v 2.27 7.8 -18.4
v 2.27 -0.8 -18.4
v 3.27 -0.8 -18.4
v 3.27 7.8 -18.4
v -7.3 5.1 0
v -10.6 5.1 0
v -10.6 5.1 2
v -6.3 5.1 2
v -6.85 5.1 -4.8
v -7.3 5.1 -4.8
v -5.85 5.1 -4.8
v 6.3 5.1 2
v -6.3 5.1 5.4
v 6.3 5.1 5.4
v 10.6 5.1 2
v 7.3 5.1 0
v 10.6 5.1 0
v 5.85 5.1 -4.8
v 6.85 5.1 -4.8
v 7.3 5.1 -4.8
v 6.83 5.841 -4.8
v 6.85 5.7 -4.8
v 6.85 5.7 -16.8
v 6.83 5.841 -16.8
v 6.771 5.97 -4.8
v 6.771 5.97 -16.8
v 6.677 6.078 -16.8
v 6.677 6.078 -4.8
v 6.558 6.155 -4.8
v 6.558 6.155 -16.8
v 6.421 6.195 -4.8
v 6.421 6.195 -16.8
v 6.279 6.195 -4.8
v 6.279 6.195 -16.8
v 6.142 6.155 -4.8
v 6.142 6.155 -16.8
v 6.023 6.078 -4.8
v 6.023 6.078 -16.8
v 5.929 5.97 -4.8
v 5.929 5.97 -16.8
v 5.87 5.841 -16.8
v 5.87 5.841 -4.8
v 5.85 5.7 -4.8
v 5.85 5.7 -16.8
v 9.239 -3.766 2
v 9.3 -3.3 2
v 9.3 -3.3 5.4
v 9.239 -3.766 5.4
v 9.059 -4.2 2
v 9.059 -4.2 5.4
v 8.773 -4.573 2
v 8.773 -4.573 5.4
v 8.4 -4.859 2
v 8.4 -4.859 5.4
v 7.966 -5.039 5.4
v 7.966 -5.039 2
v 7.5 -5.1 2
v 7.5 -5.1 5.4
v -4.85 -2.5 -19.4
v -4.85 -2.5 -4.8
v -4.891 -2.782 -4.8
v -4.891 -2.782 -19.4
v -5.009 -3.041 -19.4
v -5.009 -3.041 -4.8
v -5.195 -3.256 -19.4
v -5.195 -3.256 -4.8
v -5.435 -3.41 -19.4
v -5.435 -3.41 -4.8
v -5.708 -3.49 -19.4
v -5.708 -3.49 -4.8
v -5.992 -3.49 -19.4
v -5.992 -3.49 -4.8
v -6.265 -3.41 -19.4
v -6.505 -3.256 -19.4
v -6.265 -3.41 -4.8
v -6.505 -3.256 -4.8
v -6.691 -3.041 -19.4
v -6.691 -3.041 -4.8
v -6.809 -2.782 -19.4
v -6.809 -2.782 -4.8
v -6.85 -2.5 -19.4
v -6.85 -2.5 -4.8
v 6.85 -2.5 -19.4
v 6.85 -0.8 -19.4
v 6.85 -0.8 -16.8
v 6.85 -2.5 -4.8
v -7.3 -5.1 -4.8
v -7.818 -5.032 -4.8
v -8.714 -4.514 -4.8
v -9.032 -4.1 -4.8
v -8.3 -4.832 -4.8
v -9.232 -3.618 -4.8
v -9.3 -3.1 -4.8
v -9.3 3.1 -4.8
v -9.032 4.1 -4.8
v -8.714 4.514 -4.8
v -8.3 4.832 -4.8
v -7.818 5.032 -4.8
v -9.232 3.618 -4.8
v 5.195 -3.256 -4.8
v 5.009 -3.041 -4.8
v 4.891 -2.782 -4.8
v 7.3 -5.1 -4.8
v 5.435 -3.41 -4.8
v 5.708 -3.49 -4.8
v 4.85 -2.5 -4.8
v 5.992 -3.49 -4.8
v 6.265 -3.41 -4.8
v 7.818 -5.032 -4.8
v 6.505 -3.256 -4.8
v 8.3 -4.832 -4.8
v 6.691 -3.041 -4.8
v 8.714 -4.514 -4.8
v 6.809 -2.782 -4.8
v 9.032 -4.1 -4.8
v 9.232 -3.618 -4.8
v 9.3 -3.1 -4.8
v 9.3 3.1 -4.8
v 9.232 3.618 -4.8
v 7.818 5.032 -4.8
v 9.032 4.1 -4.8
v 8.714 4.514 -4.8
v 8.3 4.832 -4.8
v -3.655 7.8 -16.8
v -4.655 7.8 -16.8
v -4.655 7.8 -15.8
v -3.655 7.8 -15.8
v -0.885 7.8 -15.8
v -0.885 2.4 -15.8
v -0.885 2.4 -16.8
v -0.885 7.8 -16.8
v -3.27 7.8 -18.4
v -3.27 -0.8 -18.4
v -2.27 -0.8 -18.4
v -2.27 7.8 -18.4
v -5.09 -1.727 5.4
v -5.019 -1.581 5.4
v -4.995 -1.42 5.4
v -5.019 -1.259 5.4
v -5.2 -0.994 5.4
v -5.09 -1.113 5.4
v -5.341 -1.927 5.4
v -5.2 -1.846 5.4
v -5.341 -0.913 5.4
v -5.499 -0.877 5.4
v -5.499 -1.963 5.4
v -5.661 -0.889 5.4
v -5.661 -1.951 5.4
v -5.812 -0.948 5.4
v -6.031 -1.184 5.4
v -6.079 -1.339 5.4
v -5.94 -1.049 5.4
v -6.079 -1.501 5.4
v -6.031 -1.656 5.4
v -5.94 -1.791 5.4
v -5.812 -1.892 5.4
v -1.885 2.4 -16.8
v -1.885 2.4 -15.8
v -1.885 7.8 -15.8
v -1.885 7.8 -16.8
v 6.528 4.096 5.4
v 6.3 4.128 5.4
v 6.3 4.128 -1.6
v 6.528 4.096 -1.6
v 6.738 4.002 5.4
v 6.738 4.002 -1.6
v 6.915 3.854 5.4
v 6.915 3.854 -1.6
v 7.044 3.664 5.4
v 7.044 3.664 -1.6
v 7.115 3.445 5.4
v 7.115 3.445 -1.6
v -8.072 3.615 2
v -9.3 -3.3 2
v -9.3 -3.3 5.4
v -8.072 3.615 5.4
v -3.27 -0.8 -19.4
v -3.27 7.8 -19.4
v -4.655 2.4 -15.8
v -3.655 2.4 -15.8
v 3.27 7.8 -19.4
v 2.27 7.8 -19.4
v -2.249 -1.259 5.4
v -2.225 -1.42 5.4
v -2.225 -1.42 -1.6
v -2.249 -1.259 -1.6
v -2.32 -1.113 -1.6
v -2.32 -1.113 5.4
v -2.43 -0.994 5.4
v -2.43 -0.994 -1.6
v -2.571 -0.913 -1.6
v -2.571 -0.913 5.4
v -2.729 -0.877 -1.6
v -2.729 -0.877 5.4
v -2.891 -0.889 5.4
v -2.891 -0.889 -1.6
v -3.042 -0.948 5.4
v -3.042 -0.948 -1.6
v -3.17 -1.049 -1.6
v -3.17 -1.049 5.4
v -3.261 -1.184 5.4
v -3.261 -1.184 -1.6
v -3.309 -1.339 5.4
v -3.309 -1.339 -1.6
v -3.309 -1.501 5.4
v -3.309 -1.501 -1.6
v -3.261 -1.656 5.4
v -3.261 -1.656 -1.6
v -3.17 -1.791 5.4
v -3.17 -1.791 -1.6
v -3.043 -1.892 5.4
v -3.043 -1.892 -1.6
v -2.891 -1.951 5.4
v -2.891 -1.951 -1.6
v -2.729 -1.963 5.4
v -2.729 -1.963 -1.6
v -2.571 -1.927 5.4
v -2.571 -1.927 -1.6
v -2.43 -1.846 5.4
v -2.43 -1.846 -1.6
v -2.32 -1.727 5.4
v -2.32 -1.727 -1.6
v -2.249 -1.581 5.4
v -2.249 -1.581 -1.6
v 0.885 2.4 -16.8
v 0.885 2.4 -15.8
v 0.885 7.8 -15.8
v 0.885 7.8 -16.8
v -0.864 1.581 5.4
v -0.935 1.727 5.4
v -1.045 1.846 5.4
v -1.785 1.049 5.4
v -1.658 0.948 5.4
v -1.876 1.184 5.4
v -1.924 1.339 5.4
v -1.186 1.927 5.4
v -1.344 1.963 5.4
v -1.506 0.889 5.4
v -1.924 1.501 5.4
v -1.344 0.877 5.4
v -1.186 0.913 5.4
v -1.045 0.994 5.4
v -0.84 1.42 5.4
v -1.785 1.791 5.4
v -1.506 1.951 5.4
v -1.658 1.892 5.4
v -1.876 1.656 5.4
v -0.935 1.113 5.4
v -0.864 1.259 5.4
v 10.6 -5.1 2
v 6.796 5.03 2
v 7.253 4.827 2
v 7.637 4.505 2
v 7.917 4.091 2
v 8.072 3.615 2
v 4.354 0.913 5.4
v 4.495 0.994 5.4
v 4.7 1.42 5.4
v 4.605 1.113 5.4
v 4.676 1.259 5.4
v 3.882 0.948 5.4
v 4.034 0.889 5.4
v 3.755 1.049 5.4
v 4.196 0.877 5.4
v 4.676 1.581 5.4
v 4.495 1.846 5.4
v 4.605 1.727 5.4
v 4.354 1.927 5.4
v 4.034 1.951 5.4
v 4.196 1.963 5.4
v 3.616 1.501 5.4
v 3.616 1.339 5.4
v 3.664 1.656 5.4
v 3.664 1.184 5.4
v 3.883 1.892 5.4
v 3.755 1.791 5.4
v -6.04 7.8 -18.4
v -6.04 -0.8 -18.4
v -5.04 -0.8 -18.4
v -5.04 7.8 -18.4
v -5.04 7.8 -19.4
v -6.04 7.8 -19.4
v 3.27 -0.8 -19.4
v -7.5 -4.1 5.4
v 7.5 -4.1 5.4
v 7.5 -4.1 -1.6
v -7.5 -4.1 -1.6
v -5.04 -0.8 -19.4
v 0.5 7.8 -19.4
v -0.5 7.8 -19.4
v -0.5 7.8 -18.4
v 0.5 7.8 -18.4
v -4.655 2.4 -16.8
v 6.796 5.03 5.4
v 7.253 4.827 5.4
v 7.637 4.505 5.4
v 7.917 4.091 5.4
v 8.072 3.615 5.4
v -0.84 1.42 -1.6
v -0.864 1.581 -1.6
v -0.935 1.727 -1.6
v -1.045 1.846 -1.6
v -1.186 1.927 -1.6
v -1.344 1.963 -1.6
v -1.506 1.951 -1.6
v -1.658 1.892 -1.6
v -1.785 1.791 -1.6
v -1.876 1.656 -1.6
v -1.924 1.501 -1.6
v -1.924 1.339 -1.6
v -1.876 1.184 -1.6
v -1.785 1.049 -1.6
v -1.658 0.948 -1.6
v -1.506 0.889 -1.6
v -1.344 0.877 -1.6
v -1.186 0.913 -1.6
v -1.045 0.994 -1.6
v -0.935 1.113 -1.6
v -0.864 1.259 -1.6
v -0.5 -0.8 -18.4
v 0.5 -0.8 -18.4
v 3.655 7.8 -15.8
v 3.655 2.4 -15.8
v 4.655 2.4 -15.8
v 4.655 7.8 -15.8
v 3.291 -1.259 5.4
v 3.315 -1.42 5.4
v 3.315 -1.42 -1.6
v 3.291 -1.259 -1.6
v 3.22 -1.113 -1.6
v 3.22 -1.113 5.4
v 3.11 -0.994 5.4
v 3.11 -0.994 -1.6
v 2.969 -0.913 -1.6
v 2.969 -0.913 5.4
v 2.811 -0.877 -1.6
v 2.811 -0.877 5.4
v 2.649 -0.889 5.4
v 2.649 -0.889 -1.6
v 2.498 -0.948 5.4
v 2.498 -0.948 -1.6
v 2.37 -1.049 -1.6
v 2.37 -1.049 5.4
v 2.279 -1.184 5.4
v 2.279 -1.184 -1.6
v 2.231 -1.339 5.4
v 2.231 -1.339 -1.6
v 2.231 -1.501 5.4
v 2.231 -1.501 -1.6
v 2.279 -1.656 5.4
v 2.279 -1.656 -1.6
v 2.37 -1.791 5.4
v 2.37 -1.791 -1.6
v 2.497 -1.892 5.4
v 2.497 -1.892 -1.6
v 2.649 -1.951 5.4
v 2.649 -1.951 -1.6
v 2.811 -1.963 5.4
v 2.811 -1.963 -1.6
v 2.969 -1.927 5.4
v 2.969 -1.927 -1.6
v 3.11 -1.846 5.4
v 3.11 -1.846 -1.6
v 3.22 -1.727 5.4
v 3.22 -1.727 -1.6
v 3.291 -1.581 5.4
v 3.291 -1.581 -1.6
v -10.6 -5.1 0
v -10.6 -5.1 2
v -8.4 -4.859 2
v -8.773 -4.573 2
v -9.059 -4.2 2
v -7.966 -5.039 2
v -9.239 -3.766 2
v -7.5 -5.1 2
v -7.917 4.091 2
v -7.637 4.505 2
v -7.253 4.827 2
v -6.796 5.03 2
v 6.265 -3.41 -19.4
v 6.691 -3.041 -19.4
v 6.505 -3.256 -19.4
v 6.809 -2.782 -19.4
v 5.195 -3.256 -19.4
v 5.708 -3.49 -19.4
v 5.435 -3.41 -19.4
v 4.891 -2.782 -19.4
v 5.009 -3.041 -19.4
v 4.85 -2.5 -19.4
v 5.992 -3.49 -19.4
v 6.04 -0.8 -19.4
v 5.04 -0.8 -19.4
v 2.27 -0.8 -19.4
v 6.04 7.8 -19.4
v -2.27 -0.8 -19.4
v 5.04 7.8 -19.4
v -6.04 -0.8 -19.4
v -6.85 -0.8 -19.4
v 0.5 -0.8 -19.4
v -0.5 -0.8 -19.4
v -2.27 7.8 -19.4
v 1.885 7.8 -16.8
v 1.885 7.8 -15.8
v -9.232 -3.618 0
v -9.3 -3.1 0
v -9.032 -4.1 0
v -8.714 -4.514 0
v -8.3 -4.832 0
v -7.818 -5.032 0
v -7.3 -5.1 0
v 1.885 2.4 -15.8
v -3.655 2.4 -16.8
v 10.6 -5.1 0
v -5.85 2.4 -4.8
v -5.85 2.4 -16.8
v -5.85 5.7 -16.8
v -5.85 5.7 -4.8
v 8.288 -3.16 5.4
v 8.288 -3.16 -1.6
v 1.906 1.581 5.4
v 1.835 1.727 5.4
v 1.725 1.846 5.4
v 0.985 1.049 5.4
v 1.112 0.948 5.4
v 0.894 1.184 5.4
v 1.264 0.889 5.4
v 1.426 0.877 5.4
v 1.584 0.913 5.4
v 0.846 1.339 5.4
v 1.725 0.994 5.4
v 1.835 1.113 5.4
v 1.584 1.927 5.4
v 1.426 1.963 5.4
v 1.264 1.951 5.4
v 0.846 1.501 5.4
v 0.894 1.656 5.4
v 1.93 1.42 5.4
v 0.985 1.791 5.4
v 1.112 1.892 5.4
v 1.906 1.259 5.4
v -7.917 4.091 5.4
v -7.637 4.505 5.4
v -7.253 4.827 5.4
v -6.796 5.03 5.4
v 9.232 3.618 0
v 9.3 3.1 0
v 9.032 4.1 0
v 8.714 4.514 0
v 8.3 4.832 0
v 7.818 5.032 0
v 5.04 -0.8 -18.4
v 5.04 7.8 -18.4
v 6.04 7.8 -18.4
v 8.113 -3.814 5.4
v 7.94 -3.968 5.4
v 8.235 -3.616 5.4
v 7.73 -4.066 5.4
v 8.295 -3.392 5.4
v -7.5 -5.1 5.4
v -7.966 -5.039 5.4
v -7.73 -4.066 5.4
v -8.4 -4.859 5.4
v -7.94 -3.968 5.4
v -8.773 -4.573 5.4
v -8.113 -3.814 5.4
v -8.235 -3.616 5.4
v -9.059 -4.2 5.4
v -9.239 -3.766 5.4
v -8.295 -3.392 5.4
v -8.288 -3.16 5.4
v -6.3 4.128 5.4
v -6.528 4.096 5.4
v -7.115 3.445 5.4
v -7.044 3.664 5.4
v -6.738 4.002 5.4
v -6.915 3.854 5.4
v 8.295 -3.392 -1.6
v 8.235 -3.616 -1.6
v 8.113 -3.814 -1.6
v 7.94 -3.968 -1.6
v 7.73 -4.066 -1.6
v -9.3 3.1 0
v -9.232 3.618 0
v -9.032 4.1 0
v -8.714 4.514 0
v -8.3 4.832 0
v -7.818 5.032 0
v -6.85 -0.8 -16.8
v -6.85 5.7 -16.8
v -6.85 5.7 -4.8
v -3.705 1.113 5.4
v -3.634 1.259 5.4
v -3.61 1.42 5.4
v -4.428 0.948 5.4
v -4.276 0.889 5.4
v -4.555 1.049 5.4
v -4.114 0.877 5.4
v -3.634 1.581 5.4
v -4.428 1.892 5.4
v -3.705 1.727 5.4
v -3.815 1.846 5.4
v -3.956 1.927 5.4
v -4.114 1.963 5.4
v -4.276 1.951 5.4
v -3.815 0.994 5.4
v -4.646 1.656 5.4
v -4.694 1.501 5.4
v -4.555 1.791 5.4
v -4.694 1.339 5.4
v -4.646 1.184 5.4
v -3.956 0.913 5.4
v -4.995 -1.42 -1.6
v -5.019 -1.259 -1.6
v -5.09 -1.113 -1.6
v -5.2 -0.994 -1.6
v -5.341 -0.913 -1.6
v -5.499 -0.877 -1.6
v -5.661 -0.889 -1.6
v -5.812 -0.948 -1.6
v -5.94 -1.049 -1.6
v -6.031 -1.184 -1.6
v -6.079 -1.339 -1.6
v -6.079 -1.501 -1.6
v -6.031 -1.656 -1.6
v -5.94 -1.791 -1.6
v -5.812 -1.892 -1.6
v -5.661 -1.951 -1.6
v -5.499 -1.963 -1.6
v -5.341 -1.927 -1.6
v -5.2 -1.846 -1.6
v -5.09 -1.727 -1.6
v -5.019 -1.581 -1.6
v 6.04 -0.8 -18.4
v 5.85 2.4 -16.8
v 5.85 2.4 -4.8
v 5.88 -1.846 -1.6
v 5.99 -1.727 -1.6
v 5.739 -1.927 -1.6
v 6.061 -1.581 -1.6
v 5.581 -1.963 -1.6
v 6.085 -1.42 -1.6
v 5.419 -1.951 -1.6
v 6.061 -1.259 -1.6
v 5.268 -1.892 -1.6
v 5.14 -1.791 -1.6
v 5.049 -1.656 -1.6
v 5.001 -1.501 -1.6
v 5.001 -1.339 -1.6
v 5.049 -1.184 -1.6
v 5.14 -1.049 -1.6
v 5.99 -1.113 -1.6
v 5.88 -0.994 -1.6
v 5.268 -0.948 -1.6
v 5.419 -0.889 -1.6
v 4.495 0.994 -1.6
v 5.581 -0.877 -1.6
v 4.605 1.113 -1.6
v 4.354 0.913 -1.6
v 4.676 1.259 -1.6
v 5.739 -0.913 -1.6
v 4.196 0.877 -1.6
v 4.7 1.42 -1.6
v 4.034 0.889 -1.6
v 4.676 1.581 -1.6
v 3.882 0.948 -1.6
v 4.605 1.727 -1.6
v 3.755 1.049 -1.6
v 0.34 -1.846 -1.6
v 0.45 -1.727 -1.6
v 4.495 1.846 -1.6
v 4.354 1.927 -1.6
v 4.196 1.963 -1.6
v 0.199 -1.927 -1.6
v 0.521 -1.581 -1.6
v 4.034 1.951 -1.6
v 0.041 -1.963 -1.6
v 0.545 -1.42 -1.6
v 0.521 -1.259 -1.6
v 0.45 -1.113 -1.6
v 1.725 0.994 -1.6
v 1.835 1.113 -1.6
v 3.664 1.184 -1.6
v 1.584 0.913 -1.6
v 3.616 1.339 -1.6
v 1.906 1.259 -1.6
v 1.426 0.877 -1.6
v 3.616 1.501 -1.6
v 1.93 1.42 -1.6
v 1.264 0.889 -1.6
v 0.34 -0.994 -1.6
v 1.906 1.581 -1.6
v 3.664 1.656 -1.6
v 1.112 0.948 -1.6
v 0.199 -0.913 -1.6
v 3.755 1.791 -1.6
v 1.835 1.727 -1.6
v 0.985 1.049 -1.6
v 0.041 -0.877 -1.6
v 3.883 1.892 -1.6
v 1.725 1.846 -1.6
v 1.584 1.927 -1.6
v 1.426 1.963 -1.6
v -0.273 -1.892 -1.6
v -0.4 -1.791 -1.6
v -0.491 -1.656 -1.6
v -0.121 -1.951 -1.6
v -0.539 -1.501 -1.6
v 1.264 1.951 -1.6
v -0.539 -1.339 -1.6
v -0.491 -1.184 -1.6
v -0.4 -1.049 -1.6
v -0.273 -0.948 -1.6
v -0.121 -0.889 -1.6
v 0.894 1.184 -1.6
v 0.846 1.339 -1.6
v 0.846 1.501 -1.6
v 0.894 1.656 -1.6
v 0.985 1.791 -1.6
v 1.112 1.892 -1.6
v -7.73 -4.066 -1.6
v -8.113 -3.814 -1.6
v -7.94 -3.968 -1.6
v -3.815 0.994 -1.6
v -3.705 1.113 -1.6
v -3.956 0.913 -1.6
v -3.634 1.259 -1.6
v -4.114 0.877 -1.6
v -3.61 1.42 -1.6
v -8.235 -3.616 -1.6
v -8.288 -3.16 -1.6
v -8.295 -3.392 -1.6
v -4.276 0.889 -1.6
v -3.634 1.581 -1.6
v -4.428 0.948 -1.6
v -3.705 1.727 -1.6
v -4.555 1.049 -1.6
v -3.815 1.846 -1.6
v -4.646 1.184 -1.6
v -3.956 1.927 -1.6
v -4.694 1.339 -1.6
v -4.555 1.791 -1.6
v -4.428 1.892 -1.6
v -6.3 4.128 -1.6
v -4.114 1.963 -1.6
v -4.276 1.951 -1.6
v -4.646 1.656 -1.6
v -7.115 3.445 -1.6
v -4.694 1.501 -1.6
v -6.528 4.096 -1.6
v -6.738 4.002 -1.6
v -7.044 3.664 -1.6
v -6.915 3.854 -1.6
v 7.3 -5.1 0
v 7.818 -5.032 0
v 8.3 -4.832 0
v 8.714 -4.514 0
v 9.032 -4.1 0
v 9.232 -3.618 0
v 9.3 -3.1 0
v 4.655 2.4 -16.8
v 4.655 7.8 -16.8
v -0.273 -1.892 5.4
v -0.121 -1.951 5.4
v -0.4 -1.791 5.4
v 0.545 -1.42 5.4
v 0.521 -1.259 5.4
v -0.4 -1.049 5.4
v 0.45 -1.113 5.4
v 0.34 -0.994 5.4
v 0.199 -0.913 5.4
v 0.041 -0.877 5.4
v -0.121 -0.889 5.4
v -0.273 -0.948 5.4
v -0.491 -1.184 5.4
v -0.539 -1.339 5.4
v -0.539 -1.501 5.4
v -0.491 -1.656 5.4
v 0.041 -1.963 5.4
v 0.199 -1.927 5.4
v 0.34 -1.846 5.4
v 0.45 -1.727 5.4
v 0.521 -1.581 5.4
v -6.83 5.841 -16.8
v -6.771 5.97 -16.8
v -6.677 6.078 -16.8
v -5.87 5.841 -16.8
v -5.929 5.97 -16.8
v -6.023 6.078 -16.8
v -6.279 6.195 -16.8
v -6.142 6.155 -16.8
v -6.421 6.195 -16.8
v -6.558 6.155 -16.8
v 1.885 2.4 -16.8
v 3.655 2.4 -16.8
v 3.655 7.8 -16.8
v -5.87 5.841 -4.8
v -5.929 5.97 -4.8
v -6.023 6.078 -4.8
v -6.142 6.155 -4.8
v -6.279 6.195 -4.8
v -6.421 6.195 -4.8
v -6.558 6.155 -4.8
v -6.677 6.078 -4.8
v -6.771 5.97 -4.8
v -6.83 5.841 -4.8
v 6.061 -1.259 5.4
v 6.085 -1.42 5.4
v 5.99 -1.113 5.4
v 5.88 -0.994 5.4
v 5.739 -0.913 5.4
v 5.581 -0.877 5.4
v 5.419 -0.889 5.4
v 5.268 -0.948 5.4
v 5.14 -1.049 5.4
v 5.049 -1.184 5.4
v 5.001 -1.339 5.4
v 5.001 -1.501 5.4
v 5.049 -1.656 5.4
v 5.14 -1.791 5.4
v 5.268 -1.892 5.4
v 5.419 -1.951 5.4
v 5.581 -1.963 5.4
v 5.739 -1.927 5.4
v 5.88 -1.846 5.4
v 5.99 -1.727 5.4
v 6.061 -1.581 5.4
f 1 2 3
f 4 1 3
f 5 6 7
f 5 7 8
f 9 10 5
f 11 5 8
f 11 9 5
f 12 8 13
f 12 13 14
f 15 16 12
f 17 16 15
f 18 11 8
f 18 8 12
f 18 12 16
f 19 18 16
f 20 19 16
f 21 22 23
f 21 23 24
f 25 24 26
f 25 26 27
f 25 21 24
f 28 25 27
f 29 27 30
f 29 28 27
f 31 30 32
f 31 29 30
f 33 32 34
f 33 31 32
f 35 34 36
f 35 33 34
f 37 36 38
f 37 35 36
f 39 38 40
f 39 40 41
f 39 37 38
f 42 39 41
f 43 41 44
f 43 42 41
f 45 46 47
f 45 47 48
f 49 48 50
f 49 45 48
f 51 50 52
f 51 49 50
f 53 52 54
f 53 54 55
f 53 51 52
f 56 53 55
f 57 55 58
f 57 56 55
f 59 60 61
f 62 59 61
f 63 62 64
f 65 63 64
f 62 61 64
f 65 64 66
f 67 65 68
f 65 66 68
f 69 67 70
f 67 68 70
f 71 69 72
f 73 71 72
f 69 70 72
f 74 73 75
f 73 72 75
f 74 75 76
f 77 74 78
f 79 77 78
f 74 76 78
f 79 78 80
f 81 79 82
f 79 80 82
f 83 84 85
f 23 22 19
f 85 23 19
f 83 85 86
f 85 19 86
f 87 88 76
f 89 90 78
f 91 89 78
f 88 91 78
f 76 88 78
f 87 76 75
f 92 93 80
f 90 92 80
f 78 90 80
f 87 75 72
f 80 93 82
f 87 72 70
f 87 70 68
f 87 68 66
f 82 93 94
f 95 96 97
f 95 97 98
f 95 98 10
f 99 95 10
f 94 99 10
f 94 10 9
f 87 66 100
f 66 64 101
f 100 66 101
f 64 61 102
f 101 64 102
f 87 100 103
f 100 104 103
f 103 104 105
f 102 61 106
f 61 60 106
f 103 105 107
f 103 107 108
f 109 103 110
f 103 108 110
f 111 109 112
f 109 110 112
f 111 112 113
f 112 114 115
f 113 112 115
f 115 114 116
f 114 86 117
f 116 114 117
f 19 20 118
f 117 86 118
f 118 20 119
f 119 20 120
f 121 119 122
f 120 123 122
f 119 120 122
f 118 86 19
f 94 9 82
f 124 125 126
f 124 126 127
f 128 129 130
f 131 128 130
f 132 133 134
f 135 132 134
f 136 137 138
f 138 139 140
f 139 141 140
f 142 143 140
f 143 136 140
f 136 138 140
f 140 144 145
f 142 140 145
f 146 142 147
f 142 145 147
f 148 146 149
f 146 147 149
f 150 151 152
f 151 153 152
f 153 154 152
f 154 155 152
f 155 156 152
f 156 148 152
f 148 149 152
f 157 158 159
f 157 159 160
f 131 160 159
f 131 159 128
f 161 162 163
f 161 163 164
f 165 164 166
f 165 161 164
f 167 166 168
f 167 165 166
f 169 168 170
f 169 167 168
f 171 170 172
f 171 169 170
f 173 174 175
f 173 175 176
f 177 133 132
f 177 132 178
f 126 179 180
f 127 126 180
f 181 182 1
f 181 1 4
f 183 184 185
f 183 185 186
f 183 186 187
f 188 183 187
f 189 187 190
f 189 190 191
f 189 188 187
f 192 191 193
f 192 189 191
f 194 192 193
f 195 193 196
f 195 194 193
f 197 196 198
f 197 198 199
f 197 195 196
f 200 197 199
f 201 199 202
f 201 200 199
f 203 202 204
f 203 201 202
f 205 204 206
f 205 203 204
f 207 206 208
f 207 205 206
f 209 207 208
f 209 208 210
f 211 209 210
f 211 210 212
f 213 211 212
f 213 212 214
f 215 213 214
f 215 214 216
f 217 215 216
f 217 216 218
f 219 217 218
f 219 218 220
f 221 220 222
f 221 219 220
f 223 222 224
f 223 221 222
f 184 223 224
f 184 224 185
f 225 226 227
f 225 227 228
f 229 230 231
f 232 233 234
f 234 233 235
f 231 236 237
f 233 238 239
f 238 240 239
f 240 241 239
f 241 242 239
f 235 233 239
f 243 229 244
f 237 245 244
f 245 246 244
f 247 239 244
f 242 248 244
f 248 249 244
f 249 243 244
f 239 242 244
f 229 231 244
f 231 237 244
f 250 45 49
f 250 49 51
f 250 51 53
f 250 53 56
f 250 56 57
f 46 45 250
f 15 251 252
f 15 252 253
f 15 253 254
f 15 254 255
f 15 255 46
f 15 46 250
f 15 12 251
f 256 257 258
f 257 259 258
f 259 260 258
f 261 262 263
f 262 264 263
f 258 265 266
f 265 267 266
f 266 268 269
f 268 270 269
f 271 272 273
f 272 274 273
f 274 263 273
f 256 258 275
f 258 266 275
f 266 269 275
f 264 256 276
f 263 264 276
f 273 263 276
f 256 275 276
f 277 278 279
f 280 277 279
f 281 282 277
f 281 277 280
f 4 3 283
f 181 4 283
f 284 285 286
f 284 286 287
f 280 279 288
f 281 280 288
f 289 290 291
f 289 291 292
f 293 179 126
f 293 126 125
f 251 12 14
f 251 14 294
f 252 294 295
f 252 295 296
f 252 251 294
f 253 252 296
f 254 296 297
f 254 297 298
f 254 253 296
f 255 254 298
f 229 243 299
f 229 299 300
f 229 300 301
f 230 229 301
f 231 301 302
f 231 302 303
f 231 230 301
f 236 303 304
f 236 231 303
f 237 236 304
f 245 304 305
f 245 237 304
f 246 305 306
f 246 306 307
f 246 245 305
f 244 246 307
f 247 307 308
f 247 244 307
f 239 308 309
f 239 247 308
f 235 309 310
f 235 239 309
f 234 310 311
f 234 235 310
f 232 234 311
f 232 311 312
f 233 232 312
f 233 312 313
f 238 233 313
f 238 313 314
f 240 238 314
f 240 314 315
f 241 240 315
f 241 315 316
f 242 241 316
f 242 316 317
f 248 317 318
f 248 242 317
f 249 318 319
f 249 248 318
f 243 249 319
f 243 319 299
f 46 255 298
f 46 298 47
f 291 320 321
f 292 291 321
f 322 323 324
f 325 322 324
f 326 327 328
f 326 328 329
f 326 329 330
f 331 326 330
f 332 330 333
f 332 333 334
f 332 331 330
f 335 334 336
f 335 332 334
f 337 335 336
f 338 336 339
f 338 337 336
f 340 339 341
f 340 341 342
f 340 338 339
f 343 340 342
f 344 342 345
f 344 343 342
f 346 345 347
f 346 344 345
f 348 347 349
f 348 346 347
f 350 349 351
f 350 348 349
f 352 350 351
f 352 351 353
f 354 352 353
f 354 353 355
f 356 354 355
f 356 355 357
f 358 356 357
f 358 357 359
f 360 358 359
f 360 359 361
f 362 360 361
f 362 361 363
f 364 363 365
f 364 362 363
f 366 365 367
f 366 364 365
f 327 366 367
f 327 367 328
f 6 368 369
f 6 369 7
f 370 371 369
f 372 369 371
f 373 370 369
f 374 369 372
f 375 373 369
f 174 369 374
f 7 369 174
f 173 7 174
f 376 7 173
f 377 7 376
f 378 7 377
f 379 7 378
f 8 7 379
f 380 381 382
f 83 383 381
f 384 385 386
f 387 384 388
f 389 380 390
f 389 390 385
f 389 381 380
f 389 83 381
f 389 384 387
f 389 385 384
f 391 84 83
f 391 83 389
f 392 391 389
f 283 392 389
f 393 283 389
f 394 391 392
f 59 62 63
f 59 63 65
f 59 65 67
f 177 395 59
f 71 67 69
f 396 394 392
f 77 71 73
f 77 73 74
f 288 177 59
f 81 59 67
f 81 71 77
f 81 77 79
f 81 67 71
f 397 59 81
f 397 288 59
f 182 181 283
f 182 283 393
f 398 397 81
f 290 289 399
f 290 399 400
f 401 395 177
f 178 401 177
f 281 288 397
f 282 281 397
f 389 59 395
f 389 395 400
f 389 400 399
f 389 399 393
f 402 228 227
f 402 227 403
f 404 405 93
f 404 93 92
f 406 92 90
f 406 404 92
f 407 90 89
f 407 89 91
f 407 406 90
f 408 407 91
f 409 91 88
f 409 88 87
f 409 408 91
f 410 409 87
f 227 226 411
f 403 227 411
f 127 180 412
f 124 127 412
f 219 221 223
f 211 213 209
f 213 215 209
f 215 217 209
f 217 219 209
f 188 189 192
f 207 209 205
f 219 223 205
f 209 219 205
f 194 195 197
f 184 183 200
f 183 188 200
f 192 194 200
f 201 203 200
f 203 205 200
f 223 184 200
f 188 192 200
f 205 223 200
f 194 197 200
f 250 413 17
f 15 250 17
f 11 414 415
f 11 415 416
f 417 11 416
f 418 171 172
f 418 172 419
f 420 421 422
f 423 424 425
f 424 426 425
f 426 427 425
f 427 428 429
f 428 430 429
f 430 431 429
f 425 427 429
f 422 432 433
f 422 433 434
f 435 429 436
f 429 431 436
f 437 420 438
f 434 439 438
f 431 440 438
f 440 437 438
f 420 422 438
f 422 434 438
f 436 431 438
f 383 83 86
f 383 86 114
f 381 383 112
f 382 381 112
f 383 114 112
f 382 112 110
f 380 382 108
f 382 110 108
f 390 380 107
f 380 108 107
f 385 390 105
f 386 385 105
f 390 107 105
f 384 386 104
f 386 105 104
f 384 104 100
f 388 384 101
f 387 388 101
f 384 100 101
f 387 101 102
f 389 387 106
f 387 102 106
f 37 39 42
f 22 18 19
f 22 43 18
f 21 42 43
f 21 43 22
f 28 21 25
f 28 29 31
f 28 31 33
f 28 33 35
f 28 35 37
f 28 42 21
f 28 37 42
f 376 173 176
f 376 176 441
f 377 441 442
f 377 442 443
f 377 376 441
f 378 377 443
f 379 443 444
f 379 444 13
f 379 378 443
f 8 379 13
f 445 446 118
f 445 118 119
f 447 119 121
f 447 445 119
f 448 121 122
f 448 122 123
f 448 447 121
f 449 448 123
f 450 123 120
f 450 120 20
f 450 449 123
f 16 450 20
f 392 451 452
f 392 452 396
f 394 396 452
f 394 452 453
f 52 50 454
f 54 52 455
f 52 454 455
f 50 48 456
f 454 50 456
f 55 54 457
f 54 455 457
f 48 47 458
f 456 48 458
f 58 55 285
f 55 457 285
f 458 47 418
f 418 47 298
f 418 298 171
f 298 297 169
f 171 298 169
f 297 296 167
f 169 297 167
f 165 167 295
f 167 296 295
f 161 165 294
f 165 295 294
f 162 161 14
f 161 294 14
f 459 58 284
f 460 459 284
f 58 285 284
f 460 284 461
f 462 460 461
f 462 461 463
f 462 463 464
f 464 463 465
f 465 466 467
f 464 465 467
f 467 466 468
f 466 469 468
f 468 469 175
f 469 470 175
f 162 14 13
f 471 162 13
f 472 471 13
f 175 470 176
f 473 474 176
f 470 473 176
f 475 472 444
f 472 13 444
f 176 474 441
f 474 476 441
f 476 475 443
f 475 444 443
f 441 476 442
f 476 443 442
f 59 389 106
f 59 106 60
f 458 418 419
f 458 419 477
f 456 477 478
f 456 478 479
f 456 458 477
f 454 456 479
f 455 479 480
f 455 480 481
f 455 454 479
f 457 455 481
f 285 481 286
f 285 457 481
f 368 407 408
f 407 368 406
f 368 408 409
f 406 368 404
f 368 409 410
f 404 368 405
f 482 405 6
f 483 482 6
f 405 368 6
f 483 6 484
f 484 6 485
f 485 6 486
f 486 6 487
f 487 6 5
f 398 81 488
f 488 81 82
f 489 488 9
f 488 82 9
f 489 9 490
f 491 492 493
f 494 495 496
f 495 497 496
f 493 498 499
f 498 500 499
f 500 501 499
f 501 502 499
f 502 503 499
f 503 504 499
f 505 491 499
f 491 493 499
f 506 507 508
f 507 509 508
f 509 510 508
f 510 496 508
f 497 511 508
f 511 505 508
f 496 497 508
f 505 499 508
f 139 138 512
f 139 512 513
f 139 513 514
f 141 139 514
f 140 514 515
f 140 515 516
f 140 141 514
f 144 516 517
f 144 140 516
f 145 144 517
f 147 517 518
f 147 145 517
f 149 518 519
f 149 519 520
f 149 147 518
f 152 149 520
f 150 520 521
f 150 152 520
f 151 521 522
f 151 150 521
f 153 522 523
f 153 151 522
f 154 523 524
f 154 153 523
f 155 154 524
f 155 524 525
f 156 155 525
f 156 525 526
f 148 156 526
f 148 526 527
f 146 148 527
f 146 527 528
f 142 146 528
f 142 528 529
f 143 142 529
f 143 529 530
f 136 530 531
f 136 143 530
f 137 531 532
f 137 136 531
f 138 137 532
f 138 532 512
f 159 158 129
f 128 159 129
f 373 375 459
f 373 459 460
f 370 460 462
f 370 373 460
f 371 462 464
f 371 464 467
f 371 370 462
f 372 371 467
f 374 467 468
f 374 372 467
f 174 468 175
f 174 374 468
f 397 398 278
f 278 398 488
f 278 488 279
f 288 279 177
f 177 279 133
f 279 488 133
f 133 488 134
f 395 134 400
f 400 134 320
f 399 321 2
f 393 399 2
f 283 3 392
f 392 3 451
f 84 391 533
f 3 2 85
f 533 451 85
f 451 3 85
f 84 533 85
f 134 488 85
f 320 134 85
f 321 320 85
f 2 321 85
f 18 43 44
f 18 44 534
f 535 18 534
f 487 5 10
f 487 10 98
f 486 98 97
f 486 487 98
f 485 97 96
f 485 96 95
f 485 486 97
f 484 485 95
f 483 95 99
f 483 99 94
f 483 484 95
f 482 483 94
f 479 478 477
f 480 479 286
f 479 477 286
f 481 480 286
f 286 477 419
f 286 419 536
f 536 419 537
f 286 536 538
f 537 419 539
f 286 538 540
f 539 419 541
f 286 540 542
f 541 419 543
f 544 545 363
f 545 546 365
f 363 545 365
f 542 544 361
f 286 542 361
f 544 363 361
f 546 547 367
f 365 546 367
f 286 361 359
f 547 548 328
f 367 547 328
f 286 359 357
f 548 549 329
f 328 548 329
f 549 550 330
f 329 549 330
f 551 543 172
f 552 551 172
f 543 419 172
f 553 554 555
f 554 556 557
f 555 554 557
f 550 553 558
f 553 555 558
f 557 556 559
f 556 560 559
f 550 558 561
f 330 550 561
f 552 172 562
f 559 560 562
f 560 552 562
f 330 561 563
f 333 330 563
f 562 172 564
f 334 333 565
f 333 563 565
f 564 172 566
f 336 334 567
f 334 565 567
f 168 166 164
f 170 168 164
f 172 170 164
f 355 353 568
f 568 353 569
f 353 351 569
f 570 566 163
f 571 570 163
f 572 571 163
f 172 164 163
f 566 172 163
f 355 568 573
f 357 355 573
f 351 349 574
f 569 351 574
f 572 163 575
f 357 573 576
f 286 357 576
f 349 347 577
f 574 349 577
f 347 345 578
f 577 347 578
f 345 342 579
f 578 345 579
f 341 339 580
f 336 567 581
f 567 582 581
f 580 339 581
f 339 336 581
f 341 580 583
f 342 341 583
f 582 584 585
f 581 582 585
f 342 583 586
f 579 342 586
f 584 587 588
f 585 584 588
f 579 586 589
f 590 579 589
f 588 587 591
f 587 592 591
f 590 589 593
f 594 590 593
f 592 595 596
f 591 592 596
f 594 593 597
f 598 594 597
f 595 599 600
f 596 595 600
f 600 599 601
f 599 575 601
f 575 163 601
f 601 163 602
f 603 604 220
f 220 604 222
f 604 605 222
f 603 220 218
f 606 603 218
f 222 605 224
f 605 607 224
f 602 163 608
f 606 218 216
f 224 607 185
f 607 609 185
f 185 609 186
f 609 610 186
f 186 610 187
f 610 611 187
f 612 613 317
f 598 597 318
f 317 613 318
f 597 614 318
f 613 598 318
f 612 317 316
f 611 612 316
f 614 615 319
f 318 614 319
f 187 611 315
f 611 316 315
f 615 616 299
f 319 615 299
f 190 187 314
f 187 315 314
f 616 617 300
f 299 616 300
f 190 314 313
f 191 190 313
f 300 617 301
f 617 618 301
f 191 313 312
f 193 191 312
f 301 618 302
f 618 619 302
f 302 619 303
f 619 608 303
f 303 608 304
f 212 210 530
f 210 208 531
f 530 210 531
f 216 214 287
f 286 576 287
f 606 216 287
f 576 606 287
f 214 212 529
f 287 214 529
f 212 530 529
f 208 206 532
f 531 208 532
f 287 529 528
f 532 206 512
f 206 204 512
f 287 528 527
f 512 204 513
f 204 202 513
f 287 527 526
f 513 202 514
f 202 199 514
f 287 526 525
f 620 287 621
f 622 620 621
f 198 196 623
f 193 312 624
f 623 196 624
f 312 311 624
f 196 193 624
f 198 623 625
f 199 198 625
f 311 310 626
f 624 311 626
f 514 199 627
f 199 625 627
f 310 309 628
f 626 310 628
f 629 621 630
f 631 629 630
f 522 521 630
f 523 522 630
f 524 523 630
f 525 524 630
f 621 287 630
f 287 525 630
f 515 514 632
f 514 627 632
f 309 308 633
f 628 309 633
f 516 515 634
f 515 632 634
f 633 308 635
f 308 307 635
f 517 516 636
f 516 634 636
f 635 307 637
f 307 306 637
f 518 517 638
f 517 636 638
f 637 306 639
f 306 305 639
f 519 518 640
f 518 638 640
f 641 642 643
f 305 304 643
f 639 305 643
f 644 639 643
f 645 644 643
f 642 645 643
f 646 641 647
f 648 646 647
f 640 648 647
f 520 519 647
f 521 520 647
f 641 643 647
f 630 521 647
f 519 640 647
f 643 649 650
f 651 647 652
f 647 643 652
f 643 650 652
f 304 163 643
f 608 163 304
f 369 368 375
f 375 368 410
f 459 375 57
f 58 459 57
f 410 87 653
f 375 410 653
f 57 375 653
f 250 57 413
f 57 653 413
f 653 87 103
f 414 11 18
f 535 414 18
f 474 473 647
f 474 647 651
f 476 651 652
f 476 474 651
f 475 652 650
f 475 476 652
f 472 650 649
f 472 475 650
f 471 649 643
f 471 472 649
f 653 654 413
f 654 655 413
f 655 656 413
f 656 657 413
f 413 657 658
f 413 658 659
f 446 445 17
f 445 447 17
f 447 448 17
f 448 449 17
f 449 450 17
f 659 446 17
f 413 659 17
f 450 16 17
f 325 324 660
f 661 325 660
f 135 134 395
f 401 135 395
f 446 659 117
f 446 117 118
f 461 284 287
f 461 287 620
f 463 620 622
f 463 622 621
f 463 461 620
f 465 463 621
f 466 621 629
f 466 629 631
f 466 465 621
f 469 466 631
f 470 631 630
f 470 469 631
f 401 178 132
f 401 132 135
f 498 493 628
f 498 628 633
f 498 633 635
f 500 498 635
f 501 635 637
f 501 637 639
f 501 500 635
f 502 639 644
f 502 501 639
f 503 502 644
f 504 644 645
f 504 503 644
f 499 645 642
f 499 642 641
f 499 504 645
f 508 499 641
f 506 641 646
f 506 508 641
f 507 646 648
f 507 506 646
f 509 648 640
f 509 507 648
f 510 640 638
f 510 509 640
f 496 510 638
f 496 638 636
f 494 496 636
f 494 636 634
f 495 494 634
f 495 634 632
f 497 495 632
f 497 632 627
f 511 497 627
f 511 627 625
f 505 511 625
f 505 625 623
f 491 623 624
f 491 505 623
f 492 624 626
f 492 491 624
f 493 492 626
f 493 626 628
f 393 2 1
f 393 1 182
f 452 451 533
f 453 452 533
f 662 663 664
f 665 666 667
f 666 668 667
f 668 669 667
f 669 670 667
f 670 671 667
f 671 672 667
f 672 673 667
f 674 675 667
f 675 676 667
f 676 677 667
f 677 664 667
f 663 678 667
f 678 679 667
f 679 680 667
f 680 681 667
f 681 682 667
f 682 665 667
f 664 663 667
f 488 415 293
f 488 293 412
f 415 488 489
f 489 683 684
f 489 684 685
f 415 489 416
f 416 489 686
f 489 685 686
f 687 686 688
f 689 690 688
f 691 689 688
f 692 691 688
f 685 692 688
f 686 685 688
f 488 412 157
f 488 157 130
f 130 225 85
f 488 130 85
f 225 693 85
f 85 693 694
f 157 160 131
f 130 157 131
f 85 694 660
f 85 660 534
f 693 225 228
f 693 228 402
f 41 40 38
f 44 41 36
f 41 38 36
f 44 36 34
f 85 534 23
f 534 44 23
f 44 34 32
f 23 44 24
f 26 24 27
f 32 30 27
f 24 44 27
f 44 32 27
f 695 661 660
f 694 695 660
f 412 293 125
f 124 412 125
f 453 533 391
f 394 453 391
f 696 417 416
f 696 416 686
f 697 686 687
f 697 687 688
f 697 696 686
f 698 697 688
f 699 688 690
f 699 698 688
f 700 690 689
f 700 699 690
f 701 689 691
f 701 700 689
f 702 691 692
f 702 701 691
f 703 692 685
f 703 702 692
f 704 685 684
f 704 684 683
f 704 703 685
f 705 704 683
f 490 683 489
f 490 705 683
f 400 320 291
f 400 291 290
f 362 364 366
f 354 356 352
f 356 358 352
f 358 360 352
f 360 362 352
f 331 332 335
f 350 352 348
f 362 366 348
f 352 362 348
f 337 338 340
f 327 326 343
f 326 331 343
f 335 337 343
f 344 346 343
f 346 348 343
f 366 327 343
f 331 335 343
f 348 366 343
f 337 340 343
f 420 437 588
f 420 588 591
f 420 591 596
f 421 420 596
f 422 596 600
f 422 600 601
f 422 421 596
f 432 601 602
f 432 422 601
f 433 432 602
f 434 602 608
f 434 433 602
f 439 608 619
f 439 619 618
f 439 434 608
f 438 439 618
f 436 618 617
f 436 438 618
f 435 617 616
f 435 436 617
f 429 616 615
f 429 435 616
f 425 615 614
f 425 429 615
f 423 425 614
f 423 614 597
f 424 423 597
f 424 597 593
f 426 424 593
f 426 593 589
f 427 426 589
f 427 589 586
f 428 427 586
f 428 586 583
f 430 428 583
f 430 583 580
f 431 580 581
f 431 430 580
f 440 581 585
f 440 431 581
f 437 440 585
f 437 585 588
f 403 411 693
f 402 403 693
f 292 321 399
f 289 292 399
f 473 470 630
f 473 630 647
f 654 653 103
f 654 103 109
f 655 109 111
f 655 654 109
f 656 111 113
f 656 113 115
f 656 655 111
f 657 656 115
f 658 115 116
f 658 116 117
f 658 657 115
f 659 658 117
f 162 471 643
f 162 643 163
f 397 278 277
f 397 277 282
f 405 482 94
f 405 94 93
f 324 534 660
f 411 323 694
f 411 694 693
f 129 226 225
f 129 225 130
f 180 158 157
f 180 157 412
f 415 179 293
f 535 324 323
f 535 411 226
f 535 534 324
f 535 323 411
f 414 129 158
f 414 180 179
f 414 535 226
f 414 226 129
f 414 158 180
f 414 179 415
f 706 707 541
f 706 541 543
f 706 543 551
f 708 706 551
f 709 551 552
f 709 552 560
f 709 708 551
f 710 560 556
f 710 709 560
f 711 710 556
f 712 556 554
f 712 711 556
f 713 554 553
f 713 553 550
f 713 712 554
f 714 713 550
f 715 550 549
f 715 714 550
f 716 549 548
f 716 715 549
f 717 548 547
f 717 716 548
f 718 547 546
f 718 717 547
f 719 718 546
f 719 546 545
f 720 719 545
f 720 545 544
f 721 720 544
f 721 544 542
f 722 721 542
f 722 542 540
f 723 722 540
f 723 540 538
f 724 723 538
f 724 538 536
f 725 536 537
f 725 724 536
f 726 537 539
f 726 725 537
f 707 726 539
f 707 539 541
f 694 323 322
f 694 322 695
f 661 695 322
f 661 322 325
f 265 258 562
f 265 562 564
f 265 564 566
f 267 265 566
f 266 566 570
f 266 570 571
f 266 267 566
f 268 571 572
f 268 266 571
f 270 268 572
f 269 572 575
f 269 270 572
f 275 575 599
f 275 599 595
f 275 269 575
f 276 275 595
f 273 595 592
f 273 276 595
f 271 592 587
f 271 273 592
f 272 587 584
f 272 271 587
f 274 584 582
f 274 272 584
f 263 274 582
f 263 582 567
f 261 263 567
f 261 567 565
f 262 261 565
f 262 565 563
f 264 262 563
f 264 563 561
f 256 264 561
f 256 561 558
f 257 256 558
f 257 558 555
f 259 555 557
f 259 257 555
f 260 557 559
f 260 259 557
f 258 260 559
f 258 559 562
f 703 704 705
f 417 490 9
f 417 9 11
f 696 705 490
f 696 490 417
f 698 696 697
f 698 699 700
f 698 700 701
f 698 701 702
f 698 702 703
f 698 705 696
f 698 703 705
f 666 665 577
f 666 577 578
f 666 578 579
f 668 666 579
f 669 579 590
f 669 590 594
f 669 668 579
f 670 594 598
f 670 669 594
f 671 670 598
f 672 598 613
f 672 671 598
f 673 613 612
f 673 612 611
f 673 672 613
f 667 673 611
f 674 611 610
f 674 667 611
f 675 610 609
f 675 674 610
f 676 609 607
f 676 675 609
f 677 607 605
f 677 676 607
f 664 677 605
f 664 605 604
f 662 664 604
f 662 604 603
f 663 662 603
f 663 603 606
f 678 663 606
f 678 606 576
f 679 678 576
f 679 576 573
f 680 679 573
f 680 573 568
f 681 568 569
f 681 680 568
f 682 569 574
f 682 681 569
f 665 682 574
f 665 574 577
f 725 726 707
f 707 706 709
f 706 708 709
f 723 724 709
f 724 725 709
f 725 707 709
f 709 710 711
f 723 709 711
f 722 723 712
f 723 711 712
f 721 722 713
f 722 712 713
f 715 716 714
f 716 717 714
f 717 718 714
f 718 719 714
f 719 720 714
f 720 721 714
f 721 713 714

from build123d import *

# Parameters (mm, degrees)
SKETCH_1_W          = 21.2
SKETCH_1_H          = 10.2
EXTRUDE_1_DEPTH     = 2
EXTRUDE_2_DEPTH     = 3.4
EXTRUDE_3_DEPTH     = 4.8
EXTRUDE_4_DEPTH     = 12
EXTRUDE_5_DEPTH     = 2.6
SKETCH_6_R          = 0.545
CUT_EXTRUDE_1_DEPTH = 7
SKETCH_7_W          = 1
SKETCH_7_H          = 1
EXTRUDE_6_DEPTH     = 8.6
SKETCH_8_W          = 1
SKETCH_8_H          = 1
EXTRUDE_7_DEPTH     = 5.4


with BuildPart() as part:
    # Эскиз1 → Бобышка-Вытянуть1 (new body)
    with BuildSketch(Plane.XY):
        Rectangle(SKETCH_1_W, SKETCH_1_H)
    extrude(amount=EXTRUDE_1_DEPTH)

    # Эскиз2 → Бобышка-Вытянуть2 (add)
    with BuildSketch(Plane.XY.offset(2)):
        with BuildLine():
            Line((-6.3, 5.1), (6.3, 5.1))
            ThreePointArc((6.3, 5.1), (7.4561981, 4.679567307), (8.072281221, 3.614673282))
            Line((8.072281221, 3.614673282), (9.3, -3.3))
            ThreePointArc((9.3, -3.3), (8.772792206, -4.572792206), (7.5, -5.1))
            Line((7.5, -5.1), (-7.5, -5.1))
            ThreePointArc((-7.5, -5.1), (-8.772792206, -4.572792206), (-9.3, -3.3))
            Line((-9.3, -3.3), (-8.072281221, 3.614673282))
            ThreePointArc((-8.072281221, 3.614673282), (-7.4561981, 4.679567307), (-6.3, 5.1))
        make_face()
    extrude(amount=EXTRUDE_2_DEPTH)

    # Эскиз3 → Бобышка-Вытянуть3 (add)
    with BuildSketch(Plane(origin=(0, 0, 0), x_dir=(-1, 0, 0), z_dir=(0, 0, -1))):
        with BuildLine():
            Line((7.3, -5.1), (-7.3, -5.1))
            ThreePointArc((-7.3, -5.1), (-8.714213562, -4.514213562), (-9.3, -3.1))
            Line((-9.3, -3.1), (-9.3, 3.1))
            ThreePointArc((-9.3, 3.1), (-8.714213562, 4.514213562), (-7.3, 5.1))
            Line((-7.3, 5.1), (7.3, 5.1))
            ThreePointArc((7.3, 5.1), (8.714213562, 4.514213562), (9.3, 3.1))
            Line((9.3, 3.1), (9.3, -3.1))
            ThreePointArc((9.3, -3.1), (8.714213562, -4.514213562), (7.3, -5.1))
        make_face()
    extrude(amount=EXTRUDE_3_DEPTH)

    # Эскиз4 → Бобышка-Вытянуть4 (add)
    with BuildSketch(Plane(origin=(0, 0, -4.8), x_dir=(-1, 0, 0), z_dir=(0, 0, -1))):
        with BuildLine():
            Line((4.85, -2.5), (-4.85, -2.5))
            ThreePointArc((-4.85, -2.5), (-5.85, -3.5), (-6.85, -2.5))
            Line((-6.85, -2.5), (-6.85, 5.7))
            ThreePointArc((-6.85, 5.7), (-6.35, 6.2), (-5.85, 5.7))
            Line((-5.85, 5.7), (-5.85, 2.4))
            Line((-5.85, 2.4), (5.85, 2.4))
            Line((5.85, 2.4), (5.85, 5.7))
            ThreePointArc((5.85, 5.7), (6.35, 6.2), (6.85, 5.7))
            Line((6.85, 5.7), (6.85, -2.5))
            ThreePointArc((6.85, -2.5), (5.85, -3.5), (4.85, -2.5))
        make_face()
    extrude(amount=EXTRUDE_4_DEPTH)

    # Эскиз5 → Бобышка-Вытянуть5 (add)
    with BuildSketch(Plane(origin=(0, 0, -16.8), x_dir=(-1, 0, 0), z_dir=(0, 0, -1))):
        with BuildLine():
            Line((6.85, -0.8), (-6.85, -0.8))
            Line((-6.85, -0.8), (-6.85, -2.5))
            ThreePointArc((-6.85, -2.5), (-5.85, -3.5), (-4.85, -2.5))
            Line((-4.85, -2.5), (4.85, -2.5))
            ThreePointArc((4.85, -2.5), (5.85, -3.5), (6.85, -2.5))
            Line((6.85, -2.5), (6.85, -0.8))
        make_face()
    extrude(amount=EXTRUDE_5_DEPTH)

    # Эскиз6 → Вырез-Вытянуть1 (cut)
    with BuildSketch(Plane.XY.offset(5.4)):
        with BuildLine():
            Line((7.5, -4.1), (-7.5, -4.1))
            ThreePointArc((-7.5, -4.1), (-8.113141025, -3.813865822), (-8.287680543, -3.160145208))
            Line((-8.287680543, -3.160145208), (-7.114972471, 3.444700547))
            ThreePointArc((-7.114972471, 3.444700547), (-6.831670489, 3.934385426), (-6.3, 4.127718779))
            Line((-6.3, 4.127718779), (6.3, 4.127718779))
            ThreePointArc((6.3, 4.127718779), (6.831670489, 3.934385426), (7.114972471, 3.444700547))
            Line((7.114972471, 3.444700547), (8.287680543, -3.160145208))
            ThreePointArc((8.287680543, -3.160145208), (8.113141025, -3.813865822), (7.5, -4.1))
        make_face()
        with Locations((0, -1.42)):
            Circle(SKETCH_6_R, mode=Mode.SUBTRACT)
        with Locations((-2.77, -1.42)):
            Circle(SKETCH_6_R, mode=Mode.SUBTRACT)
        with Locations((-5.54, -1.42)):
            Circle(SKETCH_6_R, mode=Mode.SUBTRACT)
        with Locations((2.77, -1.42)):
            Circle(SKETCH_6_R, mode=Mode.SUBTRACT)
        with Locations((5.54, -1.42)):
            Circle(SKETCH_6_R, mode=Mode.SUBTRACT)
        with Locations((1.385, 1.42)):
            Circle(SKETCH_6_R, mode=Mode.SUBTRACT)
        with Locations((-1.385, 1.42)):
            Circle(SKETCH_6_R, mode=Mode.SUBTRACT)
        with Locations((-4.155, 1.42)):
            Circle(SKETCH_6_R, mode=Mode.SUBTRACT)
        with Locations((4.155, 1.42)):
            Circle(SKETCH_6_R, mode=Mode.SUBTRACT)
    extrude(amount=-CUT_EXTRUDE_1_DEPTH, mode=Mode.SUBTRACT)

    # Эскиз7 → Бобышка-Вытянуть6 (add)
    with BuildSketch(Plane(origin=(0, -0.8, 0), x_dir=(1, 0, 0), z_dir=(0, 1, 0))):
        with Locations((0, 18.9)):
            Rectangle(SKETCH_7_W, SKETCH_7_H)
        with Locations((2.77, 18.9)):
            Rectangle(SKETCH_7_W, SKETCH_7_H)
        with Locations((5.54, 18.9)):
            Rectangle(SKETCH_7_W, SKETCH_7_H)
        with Locations((-2.77, 18.9)):
            Rectangle(SKETCH_7_W, SKETCH_7_H)
        with Locations((-5.54, 18.9)):
            Rectangle(SKETCH_7_W, SKETCH_7_H)
    extrude(amount=EXTRUDE_6_DEPTH)

    # Эскиз8 → Бобышка-Вытянуть7 (add)
    with BuildSketch(Plane(origin=(0, 2.4, 0), x_dir=(1, 0, 0), z_dir=(0, 1, 0))):
        with Locations((-1.385, 16.3)):
            Rectangle(SKETCH_8_W, SKETCH_8_H)
        with Locations((1.385, 16.3)):
            Rectangle(SKETCH_8_W, SKETCH_8_H)
        with Locations((4.155, 16.3)):
            Rectangle(SKETCH_8_W, SKETCH_8_H)
        with Locations((-4.155, 16.3)):
            Rectangle(SKETCH_8_W, SKETCH_8_H)
    extrude(amount=EXTRUDE_7_DEPTH)


solid = part.part
